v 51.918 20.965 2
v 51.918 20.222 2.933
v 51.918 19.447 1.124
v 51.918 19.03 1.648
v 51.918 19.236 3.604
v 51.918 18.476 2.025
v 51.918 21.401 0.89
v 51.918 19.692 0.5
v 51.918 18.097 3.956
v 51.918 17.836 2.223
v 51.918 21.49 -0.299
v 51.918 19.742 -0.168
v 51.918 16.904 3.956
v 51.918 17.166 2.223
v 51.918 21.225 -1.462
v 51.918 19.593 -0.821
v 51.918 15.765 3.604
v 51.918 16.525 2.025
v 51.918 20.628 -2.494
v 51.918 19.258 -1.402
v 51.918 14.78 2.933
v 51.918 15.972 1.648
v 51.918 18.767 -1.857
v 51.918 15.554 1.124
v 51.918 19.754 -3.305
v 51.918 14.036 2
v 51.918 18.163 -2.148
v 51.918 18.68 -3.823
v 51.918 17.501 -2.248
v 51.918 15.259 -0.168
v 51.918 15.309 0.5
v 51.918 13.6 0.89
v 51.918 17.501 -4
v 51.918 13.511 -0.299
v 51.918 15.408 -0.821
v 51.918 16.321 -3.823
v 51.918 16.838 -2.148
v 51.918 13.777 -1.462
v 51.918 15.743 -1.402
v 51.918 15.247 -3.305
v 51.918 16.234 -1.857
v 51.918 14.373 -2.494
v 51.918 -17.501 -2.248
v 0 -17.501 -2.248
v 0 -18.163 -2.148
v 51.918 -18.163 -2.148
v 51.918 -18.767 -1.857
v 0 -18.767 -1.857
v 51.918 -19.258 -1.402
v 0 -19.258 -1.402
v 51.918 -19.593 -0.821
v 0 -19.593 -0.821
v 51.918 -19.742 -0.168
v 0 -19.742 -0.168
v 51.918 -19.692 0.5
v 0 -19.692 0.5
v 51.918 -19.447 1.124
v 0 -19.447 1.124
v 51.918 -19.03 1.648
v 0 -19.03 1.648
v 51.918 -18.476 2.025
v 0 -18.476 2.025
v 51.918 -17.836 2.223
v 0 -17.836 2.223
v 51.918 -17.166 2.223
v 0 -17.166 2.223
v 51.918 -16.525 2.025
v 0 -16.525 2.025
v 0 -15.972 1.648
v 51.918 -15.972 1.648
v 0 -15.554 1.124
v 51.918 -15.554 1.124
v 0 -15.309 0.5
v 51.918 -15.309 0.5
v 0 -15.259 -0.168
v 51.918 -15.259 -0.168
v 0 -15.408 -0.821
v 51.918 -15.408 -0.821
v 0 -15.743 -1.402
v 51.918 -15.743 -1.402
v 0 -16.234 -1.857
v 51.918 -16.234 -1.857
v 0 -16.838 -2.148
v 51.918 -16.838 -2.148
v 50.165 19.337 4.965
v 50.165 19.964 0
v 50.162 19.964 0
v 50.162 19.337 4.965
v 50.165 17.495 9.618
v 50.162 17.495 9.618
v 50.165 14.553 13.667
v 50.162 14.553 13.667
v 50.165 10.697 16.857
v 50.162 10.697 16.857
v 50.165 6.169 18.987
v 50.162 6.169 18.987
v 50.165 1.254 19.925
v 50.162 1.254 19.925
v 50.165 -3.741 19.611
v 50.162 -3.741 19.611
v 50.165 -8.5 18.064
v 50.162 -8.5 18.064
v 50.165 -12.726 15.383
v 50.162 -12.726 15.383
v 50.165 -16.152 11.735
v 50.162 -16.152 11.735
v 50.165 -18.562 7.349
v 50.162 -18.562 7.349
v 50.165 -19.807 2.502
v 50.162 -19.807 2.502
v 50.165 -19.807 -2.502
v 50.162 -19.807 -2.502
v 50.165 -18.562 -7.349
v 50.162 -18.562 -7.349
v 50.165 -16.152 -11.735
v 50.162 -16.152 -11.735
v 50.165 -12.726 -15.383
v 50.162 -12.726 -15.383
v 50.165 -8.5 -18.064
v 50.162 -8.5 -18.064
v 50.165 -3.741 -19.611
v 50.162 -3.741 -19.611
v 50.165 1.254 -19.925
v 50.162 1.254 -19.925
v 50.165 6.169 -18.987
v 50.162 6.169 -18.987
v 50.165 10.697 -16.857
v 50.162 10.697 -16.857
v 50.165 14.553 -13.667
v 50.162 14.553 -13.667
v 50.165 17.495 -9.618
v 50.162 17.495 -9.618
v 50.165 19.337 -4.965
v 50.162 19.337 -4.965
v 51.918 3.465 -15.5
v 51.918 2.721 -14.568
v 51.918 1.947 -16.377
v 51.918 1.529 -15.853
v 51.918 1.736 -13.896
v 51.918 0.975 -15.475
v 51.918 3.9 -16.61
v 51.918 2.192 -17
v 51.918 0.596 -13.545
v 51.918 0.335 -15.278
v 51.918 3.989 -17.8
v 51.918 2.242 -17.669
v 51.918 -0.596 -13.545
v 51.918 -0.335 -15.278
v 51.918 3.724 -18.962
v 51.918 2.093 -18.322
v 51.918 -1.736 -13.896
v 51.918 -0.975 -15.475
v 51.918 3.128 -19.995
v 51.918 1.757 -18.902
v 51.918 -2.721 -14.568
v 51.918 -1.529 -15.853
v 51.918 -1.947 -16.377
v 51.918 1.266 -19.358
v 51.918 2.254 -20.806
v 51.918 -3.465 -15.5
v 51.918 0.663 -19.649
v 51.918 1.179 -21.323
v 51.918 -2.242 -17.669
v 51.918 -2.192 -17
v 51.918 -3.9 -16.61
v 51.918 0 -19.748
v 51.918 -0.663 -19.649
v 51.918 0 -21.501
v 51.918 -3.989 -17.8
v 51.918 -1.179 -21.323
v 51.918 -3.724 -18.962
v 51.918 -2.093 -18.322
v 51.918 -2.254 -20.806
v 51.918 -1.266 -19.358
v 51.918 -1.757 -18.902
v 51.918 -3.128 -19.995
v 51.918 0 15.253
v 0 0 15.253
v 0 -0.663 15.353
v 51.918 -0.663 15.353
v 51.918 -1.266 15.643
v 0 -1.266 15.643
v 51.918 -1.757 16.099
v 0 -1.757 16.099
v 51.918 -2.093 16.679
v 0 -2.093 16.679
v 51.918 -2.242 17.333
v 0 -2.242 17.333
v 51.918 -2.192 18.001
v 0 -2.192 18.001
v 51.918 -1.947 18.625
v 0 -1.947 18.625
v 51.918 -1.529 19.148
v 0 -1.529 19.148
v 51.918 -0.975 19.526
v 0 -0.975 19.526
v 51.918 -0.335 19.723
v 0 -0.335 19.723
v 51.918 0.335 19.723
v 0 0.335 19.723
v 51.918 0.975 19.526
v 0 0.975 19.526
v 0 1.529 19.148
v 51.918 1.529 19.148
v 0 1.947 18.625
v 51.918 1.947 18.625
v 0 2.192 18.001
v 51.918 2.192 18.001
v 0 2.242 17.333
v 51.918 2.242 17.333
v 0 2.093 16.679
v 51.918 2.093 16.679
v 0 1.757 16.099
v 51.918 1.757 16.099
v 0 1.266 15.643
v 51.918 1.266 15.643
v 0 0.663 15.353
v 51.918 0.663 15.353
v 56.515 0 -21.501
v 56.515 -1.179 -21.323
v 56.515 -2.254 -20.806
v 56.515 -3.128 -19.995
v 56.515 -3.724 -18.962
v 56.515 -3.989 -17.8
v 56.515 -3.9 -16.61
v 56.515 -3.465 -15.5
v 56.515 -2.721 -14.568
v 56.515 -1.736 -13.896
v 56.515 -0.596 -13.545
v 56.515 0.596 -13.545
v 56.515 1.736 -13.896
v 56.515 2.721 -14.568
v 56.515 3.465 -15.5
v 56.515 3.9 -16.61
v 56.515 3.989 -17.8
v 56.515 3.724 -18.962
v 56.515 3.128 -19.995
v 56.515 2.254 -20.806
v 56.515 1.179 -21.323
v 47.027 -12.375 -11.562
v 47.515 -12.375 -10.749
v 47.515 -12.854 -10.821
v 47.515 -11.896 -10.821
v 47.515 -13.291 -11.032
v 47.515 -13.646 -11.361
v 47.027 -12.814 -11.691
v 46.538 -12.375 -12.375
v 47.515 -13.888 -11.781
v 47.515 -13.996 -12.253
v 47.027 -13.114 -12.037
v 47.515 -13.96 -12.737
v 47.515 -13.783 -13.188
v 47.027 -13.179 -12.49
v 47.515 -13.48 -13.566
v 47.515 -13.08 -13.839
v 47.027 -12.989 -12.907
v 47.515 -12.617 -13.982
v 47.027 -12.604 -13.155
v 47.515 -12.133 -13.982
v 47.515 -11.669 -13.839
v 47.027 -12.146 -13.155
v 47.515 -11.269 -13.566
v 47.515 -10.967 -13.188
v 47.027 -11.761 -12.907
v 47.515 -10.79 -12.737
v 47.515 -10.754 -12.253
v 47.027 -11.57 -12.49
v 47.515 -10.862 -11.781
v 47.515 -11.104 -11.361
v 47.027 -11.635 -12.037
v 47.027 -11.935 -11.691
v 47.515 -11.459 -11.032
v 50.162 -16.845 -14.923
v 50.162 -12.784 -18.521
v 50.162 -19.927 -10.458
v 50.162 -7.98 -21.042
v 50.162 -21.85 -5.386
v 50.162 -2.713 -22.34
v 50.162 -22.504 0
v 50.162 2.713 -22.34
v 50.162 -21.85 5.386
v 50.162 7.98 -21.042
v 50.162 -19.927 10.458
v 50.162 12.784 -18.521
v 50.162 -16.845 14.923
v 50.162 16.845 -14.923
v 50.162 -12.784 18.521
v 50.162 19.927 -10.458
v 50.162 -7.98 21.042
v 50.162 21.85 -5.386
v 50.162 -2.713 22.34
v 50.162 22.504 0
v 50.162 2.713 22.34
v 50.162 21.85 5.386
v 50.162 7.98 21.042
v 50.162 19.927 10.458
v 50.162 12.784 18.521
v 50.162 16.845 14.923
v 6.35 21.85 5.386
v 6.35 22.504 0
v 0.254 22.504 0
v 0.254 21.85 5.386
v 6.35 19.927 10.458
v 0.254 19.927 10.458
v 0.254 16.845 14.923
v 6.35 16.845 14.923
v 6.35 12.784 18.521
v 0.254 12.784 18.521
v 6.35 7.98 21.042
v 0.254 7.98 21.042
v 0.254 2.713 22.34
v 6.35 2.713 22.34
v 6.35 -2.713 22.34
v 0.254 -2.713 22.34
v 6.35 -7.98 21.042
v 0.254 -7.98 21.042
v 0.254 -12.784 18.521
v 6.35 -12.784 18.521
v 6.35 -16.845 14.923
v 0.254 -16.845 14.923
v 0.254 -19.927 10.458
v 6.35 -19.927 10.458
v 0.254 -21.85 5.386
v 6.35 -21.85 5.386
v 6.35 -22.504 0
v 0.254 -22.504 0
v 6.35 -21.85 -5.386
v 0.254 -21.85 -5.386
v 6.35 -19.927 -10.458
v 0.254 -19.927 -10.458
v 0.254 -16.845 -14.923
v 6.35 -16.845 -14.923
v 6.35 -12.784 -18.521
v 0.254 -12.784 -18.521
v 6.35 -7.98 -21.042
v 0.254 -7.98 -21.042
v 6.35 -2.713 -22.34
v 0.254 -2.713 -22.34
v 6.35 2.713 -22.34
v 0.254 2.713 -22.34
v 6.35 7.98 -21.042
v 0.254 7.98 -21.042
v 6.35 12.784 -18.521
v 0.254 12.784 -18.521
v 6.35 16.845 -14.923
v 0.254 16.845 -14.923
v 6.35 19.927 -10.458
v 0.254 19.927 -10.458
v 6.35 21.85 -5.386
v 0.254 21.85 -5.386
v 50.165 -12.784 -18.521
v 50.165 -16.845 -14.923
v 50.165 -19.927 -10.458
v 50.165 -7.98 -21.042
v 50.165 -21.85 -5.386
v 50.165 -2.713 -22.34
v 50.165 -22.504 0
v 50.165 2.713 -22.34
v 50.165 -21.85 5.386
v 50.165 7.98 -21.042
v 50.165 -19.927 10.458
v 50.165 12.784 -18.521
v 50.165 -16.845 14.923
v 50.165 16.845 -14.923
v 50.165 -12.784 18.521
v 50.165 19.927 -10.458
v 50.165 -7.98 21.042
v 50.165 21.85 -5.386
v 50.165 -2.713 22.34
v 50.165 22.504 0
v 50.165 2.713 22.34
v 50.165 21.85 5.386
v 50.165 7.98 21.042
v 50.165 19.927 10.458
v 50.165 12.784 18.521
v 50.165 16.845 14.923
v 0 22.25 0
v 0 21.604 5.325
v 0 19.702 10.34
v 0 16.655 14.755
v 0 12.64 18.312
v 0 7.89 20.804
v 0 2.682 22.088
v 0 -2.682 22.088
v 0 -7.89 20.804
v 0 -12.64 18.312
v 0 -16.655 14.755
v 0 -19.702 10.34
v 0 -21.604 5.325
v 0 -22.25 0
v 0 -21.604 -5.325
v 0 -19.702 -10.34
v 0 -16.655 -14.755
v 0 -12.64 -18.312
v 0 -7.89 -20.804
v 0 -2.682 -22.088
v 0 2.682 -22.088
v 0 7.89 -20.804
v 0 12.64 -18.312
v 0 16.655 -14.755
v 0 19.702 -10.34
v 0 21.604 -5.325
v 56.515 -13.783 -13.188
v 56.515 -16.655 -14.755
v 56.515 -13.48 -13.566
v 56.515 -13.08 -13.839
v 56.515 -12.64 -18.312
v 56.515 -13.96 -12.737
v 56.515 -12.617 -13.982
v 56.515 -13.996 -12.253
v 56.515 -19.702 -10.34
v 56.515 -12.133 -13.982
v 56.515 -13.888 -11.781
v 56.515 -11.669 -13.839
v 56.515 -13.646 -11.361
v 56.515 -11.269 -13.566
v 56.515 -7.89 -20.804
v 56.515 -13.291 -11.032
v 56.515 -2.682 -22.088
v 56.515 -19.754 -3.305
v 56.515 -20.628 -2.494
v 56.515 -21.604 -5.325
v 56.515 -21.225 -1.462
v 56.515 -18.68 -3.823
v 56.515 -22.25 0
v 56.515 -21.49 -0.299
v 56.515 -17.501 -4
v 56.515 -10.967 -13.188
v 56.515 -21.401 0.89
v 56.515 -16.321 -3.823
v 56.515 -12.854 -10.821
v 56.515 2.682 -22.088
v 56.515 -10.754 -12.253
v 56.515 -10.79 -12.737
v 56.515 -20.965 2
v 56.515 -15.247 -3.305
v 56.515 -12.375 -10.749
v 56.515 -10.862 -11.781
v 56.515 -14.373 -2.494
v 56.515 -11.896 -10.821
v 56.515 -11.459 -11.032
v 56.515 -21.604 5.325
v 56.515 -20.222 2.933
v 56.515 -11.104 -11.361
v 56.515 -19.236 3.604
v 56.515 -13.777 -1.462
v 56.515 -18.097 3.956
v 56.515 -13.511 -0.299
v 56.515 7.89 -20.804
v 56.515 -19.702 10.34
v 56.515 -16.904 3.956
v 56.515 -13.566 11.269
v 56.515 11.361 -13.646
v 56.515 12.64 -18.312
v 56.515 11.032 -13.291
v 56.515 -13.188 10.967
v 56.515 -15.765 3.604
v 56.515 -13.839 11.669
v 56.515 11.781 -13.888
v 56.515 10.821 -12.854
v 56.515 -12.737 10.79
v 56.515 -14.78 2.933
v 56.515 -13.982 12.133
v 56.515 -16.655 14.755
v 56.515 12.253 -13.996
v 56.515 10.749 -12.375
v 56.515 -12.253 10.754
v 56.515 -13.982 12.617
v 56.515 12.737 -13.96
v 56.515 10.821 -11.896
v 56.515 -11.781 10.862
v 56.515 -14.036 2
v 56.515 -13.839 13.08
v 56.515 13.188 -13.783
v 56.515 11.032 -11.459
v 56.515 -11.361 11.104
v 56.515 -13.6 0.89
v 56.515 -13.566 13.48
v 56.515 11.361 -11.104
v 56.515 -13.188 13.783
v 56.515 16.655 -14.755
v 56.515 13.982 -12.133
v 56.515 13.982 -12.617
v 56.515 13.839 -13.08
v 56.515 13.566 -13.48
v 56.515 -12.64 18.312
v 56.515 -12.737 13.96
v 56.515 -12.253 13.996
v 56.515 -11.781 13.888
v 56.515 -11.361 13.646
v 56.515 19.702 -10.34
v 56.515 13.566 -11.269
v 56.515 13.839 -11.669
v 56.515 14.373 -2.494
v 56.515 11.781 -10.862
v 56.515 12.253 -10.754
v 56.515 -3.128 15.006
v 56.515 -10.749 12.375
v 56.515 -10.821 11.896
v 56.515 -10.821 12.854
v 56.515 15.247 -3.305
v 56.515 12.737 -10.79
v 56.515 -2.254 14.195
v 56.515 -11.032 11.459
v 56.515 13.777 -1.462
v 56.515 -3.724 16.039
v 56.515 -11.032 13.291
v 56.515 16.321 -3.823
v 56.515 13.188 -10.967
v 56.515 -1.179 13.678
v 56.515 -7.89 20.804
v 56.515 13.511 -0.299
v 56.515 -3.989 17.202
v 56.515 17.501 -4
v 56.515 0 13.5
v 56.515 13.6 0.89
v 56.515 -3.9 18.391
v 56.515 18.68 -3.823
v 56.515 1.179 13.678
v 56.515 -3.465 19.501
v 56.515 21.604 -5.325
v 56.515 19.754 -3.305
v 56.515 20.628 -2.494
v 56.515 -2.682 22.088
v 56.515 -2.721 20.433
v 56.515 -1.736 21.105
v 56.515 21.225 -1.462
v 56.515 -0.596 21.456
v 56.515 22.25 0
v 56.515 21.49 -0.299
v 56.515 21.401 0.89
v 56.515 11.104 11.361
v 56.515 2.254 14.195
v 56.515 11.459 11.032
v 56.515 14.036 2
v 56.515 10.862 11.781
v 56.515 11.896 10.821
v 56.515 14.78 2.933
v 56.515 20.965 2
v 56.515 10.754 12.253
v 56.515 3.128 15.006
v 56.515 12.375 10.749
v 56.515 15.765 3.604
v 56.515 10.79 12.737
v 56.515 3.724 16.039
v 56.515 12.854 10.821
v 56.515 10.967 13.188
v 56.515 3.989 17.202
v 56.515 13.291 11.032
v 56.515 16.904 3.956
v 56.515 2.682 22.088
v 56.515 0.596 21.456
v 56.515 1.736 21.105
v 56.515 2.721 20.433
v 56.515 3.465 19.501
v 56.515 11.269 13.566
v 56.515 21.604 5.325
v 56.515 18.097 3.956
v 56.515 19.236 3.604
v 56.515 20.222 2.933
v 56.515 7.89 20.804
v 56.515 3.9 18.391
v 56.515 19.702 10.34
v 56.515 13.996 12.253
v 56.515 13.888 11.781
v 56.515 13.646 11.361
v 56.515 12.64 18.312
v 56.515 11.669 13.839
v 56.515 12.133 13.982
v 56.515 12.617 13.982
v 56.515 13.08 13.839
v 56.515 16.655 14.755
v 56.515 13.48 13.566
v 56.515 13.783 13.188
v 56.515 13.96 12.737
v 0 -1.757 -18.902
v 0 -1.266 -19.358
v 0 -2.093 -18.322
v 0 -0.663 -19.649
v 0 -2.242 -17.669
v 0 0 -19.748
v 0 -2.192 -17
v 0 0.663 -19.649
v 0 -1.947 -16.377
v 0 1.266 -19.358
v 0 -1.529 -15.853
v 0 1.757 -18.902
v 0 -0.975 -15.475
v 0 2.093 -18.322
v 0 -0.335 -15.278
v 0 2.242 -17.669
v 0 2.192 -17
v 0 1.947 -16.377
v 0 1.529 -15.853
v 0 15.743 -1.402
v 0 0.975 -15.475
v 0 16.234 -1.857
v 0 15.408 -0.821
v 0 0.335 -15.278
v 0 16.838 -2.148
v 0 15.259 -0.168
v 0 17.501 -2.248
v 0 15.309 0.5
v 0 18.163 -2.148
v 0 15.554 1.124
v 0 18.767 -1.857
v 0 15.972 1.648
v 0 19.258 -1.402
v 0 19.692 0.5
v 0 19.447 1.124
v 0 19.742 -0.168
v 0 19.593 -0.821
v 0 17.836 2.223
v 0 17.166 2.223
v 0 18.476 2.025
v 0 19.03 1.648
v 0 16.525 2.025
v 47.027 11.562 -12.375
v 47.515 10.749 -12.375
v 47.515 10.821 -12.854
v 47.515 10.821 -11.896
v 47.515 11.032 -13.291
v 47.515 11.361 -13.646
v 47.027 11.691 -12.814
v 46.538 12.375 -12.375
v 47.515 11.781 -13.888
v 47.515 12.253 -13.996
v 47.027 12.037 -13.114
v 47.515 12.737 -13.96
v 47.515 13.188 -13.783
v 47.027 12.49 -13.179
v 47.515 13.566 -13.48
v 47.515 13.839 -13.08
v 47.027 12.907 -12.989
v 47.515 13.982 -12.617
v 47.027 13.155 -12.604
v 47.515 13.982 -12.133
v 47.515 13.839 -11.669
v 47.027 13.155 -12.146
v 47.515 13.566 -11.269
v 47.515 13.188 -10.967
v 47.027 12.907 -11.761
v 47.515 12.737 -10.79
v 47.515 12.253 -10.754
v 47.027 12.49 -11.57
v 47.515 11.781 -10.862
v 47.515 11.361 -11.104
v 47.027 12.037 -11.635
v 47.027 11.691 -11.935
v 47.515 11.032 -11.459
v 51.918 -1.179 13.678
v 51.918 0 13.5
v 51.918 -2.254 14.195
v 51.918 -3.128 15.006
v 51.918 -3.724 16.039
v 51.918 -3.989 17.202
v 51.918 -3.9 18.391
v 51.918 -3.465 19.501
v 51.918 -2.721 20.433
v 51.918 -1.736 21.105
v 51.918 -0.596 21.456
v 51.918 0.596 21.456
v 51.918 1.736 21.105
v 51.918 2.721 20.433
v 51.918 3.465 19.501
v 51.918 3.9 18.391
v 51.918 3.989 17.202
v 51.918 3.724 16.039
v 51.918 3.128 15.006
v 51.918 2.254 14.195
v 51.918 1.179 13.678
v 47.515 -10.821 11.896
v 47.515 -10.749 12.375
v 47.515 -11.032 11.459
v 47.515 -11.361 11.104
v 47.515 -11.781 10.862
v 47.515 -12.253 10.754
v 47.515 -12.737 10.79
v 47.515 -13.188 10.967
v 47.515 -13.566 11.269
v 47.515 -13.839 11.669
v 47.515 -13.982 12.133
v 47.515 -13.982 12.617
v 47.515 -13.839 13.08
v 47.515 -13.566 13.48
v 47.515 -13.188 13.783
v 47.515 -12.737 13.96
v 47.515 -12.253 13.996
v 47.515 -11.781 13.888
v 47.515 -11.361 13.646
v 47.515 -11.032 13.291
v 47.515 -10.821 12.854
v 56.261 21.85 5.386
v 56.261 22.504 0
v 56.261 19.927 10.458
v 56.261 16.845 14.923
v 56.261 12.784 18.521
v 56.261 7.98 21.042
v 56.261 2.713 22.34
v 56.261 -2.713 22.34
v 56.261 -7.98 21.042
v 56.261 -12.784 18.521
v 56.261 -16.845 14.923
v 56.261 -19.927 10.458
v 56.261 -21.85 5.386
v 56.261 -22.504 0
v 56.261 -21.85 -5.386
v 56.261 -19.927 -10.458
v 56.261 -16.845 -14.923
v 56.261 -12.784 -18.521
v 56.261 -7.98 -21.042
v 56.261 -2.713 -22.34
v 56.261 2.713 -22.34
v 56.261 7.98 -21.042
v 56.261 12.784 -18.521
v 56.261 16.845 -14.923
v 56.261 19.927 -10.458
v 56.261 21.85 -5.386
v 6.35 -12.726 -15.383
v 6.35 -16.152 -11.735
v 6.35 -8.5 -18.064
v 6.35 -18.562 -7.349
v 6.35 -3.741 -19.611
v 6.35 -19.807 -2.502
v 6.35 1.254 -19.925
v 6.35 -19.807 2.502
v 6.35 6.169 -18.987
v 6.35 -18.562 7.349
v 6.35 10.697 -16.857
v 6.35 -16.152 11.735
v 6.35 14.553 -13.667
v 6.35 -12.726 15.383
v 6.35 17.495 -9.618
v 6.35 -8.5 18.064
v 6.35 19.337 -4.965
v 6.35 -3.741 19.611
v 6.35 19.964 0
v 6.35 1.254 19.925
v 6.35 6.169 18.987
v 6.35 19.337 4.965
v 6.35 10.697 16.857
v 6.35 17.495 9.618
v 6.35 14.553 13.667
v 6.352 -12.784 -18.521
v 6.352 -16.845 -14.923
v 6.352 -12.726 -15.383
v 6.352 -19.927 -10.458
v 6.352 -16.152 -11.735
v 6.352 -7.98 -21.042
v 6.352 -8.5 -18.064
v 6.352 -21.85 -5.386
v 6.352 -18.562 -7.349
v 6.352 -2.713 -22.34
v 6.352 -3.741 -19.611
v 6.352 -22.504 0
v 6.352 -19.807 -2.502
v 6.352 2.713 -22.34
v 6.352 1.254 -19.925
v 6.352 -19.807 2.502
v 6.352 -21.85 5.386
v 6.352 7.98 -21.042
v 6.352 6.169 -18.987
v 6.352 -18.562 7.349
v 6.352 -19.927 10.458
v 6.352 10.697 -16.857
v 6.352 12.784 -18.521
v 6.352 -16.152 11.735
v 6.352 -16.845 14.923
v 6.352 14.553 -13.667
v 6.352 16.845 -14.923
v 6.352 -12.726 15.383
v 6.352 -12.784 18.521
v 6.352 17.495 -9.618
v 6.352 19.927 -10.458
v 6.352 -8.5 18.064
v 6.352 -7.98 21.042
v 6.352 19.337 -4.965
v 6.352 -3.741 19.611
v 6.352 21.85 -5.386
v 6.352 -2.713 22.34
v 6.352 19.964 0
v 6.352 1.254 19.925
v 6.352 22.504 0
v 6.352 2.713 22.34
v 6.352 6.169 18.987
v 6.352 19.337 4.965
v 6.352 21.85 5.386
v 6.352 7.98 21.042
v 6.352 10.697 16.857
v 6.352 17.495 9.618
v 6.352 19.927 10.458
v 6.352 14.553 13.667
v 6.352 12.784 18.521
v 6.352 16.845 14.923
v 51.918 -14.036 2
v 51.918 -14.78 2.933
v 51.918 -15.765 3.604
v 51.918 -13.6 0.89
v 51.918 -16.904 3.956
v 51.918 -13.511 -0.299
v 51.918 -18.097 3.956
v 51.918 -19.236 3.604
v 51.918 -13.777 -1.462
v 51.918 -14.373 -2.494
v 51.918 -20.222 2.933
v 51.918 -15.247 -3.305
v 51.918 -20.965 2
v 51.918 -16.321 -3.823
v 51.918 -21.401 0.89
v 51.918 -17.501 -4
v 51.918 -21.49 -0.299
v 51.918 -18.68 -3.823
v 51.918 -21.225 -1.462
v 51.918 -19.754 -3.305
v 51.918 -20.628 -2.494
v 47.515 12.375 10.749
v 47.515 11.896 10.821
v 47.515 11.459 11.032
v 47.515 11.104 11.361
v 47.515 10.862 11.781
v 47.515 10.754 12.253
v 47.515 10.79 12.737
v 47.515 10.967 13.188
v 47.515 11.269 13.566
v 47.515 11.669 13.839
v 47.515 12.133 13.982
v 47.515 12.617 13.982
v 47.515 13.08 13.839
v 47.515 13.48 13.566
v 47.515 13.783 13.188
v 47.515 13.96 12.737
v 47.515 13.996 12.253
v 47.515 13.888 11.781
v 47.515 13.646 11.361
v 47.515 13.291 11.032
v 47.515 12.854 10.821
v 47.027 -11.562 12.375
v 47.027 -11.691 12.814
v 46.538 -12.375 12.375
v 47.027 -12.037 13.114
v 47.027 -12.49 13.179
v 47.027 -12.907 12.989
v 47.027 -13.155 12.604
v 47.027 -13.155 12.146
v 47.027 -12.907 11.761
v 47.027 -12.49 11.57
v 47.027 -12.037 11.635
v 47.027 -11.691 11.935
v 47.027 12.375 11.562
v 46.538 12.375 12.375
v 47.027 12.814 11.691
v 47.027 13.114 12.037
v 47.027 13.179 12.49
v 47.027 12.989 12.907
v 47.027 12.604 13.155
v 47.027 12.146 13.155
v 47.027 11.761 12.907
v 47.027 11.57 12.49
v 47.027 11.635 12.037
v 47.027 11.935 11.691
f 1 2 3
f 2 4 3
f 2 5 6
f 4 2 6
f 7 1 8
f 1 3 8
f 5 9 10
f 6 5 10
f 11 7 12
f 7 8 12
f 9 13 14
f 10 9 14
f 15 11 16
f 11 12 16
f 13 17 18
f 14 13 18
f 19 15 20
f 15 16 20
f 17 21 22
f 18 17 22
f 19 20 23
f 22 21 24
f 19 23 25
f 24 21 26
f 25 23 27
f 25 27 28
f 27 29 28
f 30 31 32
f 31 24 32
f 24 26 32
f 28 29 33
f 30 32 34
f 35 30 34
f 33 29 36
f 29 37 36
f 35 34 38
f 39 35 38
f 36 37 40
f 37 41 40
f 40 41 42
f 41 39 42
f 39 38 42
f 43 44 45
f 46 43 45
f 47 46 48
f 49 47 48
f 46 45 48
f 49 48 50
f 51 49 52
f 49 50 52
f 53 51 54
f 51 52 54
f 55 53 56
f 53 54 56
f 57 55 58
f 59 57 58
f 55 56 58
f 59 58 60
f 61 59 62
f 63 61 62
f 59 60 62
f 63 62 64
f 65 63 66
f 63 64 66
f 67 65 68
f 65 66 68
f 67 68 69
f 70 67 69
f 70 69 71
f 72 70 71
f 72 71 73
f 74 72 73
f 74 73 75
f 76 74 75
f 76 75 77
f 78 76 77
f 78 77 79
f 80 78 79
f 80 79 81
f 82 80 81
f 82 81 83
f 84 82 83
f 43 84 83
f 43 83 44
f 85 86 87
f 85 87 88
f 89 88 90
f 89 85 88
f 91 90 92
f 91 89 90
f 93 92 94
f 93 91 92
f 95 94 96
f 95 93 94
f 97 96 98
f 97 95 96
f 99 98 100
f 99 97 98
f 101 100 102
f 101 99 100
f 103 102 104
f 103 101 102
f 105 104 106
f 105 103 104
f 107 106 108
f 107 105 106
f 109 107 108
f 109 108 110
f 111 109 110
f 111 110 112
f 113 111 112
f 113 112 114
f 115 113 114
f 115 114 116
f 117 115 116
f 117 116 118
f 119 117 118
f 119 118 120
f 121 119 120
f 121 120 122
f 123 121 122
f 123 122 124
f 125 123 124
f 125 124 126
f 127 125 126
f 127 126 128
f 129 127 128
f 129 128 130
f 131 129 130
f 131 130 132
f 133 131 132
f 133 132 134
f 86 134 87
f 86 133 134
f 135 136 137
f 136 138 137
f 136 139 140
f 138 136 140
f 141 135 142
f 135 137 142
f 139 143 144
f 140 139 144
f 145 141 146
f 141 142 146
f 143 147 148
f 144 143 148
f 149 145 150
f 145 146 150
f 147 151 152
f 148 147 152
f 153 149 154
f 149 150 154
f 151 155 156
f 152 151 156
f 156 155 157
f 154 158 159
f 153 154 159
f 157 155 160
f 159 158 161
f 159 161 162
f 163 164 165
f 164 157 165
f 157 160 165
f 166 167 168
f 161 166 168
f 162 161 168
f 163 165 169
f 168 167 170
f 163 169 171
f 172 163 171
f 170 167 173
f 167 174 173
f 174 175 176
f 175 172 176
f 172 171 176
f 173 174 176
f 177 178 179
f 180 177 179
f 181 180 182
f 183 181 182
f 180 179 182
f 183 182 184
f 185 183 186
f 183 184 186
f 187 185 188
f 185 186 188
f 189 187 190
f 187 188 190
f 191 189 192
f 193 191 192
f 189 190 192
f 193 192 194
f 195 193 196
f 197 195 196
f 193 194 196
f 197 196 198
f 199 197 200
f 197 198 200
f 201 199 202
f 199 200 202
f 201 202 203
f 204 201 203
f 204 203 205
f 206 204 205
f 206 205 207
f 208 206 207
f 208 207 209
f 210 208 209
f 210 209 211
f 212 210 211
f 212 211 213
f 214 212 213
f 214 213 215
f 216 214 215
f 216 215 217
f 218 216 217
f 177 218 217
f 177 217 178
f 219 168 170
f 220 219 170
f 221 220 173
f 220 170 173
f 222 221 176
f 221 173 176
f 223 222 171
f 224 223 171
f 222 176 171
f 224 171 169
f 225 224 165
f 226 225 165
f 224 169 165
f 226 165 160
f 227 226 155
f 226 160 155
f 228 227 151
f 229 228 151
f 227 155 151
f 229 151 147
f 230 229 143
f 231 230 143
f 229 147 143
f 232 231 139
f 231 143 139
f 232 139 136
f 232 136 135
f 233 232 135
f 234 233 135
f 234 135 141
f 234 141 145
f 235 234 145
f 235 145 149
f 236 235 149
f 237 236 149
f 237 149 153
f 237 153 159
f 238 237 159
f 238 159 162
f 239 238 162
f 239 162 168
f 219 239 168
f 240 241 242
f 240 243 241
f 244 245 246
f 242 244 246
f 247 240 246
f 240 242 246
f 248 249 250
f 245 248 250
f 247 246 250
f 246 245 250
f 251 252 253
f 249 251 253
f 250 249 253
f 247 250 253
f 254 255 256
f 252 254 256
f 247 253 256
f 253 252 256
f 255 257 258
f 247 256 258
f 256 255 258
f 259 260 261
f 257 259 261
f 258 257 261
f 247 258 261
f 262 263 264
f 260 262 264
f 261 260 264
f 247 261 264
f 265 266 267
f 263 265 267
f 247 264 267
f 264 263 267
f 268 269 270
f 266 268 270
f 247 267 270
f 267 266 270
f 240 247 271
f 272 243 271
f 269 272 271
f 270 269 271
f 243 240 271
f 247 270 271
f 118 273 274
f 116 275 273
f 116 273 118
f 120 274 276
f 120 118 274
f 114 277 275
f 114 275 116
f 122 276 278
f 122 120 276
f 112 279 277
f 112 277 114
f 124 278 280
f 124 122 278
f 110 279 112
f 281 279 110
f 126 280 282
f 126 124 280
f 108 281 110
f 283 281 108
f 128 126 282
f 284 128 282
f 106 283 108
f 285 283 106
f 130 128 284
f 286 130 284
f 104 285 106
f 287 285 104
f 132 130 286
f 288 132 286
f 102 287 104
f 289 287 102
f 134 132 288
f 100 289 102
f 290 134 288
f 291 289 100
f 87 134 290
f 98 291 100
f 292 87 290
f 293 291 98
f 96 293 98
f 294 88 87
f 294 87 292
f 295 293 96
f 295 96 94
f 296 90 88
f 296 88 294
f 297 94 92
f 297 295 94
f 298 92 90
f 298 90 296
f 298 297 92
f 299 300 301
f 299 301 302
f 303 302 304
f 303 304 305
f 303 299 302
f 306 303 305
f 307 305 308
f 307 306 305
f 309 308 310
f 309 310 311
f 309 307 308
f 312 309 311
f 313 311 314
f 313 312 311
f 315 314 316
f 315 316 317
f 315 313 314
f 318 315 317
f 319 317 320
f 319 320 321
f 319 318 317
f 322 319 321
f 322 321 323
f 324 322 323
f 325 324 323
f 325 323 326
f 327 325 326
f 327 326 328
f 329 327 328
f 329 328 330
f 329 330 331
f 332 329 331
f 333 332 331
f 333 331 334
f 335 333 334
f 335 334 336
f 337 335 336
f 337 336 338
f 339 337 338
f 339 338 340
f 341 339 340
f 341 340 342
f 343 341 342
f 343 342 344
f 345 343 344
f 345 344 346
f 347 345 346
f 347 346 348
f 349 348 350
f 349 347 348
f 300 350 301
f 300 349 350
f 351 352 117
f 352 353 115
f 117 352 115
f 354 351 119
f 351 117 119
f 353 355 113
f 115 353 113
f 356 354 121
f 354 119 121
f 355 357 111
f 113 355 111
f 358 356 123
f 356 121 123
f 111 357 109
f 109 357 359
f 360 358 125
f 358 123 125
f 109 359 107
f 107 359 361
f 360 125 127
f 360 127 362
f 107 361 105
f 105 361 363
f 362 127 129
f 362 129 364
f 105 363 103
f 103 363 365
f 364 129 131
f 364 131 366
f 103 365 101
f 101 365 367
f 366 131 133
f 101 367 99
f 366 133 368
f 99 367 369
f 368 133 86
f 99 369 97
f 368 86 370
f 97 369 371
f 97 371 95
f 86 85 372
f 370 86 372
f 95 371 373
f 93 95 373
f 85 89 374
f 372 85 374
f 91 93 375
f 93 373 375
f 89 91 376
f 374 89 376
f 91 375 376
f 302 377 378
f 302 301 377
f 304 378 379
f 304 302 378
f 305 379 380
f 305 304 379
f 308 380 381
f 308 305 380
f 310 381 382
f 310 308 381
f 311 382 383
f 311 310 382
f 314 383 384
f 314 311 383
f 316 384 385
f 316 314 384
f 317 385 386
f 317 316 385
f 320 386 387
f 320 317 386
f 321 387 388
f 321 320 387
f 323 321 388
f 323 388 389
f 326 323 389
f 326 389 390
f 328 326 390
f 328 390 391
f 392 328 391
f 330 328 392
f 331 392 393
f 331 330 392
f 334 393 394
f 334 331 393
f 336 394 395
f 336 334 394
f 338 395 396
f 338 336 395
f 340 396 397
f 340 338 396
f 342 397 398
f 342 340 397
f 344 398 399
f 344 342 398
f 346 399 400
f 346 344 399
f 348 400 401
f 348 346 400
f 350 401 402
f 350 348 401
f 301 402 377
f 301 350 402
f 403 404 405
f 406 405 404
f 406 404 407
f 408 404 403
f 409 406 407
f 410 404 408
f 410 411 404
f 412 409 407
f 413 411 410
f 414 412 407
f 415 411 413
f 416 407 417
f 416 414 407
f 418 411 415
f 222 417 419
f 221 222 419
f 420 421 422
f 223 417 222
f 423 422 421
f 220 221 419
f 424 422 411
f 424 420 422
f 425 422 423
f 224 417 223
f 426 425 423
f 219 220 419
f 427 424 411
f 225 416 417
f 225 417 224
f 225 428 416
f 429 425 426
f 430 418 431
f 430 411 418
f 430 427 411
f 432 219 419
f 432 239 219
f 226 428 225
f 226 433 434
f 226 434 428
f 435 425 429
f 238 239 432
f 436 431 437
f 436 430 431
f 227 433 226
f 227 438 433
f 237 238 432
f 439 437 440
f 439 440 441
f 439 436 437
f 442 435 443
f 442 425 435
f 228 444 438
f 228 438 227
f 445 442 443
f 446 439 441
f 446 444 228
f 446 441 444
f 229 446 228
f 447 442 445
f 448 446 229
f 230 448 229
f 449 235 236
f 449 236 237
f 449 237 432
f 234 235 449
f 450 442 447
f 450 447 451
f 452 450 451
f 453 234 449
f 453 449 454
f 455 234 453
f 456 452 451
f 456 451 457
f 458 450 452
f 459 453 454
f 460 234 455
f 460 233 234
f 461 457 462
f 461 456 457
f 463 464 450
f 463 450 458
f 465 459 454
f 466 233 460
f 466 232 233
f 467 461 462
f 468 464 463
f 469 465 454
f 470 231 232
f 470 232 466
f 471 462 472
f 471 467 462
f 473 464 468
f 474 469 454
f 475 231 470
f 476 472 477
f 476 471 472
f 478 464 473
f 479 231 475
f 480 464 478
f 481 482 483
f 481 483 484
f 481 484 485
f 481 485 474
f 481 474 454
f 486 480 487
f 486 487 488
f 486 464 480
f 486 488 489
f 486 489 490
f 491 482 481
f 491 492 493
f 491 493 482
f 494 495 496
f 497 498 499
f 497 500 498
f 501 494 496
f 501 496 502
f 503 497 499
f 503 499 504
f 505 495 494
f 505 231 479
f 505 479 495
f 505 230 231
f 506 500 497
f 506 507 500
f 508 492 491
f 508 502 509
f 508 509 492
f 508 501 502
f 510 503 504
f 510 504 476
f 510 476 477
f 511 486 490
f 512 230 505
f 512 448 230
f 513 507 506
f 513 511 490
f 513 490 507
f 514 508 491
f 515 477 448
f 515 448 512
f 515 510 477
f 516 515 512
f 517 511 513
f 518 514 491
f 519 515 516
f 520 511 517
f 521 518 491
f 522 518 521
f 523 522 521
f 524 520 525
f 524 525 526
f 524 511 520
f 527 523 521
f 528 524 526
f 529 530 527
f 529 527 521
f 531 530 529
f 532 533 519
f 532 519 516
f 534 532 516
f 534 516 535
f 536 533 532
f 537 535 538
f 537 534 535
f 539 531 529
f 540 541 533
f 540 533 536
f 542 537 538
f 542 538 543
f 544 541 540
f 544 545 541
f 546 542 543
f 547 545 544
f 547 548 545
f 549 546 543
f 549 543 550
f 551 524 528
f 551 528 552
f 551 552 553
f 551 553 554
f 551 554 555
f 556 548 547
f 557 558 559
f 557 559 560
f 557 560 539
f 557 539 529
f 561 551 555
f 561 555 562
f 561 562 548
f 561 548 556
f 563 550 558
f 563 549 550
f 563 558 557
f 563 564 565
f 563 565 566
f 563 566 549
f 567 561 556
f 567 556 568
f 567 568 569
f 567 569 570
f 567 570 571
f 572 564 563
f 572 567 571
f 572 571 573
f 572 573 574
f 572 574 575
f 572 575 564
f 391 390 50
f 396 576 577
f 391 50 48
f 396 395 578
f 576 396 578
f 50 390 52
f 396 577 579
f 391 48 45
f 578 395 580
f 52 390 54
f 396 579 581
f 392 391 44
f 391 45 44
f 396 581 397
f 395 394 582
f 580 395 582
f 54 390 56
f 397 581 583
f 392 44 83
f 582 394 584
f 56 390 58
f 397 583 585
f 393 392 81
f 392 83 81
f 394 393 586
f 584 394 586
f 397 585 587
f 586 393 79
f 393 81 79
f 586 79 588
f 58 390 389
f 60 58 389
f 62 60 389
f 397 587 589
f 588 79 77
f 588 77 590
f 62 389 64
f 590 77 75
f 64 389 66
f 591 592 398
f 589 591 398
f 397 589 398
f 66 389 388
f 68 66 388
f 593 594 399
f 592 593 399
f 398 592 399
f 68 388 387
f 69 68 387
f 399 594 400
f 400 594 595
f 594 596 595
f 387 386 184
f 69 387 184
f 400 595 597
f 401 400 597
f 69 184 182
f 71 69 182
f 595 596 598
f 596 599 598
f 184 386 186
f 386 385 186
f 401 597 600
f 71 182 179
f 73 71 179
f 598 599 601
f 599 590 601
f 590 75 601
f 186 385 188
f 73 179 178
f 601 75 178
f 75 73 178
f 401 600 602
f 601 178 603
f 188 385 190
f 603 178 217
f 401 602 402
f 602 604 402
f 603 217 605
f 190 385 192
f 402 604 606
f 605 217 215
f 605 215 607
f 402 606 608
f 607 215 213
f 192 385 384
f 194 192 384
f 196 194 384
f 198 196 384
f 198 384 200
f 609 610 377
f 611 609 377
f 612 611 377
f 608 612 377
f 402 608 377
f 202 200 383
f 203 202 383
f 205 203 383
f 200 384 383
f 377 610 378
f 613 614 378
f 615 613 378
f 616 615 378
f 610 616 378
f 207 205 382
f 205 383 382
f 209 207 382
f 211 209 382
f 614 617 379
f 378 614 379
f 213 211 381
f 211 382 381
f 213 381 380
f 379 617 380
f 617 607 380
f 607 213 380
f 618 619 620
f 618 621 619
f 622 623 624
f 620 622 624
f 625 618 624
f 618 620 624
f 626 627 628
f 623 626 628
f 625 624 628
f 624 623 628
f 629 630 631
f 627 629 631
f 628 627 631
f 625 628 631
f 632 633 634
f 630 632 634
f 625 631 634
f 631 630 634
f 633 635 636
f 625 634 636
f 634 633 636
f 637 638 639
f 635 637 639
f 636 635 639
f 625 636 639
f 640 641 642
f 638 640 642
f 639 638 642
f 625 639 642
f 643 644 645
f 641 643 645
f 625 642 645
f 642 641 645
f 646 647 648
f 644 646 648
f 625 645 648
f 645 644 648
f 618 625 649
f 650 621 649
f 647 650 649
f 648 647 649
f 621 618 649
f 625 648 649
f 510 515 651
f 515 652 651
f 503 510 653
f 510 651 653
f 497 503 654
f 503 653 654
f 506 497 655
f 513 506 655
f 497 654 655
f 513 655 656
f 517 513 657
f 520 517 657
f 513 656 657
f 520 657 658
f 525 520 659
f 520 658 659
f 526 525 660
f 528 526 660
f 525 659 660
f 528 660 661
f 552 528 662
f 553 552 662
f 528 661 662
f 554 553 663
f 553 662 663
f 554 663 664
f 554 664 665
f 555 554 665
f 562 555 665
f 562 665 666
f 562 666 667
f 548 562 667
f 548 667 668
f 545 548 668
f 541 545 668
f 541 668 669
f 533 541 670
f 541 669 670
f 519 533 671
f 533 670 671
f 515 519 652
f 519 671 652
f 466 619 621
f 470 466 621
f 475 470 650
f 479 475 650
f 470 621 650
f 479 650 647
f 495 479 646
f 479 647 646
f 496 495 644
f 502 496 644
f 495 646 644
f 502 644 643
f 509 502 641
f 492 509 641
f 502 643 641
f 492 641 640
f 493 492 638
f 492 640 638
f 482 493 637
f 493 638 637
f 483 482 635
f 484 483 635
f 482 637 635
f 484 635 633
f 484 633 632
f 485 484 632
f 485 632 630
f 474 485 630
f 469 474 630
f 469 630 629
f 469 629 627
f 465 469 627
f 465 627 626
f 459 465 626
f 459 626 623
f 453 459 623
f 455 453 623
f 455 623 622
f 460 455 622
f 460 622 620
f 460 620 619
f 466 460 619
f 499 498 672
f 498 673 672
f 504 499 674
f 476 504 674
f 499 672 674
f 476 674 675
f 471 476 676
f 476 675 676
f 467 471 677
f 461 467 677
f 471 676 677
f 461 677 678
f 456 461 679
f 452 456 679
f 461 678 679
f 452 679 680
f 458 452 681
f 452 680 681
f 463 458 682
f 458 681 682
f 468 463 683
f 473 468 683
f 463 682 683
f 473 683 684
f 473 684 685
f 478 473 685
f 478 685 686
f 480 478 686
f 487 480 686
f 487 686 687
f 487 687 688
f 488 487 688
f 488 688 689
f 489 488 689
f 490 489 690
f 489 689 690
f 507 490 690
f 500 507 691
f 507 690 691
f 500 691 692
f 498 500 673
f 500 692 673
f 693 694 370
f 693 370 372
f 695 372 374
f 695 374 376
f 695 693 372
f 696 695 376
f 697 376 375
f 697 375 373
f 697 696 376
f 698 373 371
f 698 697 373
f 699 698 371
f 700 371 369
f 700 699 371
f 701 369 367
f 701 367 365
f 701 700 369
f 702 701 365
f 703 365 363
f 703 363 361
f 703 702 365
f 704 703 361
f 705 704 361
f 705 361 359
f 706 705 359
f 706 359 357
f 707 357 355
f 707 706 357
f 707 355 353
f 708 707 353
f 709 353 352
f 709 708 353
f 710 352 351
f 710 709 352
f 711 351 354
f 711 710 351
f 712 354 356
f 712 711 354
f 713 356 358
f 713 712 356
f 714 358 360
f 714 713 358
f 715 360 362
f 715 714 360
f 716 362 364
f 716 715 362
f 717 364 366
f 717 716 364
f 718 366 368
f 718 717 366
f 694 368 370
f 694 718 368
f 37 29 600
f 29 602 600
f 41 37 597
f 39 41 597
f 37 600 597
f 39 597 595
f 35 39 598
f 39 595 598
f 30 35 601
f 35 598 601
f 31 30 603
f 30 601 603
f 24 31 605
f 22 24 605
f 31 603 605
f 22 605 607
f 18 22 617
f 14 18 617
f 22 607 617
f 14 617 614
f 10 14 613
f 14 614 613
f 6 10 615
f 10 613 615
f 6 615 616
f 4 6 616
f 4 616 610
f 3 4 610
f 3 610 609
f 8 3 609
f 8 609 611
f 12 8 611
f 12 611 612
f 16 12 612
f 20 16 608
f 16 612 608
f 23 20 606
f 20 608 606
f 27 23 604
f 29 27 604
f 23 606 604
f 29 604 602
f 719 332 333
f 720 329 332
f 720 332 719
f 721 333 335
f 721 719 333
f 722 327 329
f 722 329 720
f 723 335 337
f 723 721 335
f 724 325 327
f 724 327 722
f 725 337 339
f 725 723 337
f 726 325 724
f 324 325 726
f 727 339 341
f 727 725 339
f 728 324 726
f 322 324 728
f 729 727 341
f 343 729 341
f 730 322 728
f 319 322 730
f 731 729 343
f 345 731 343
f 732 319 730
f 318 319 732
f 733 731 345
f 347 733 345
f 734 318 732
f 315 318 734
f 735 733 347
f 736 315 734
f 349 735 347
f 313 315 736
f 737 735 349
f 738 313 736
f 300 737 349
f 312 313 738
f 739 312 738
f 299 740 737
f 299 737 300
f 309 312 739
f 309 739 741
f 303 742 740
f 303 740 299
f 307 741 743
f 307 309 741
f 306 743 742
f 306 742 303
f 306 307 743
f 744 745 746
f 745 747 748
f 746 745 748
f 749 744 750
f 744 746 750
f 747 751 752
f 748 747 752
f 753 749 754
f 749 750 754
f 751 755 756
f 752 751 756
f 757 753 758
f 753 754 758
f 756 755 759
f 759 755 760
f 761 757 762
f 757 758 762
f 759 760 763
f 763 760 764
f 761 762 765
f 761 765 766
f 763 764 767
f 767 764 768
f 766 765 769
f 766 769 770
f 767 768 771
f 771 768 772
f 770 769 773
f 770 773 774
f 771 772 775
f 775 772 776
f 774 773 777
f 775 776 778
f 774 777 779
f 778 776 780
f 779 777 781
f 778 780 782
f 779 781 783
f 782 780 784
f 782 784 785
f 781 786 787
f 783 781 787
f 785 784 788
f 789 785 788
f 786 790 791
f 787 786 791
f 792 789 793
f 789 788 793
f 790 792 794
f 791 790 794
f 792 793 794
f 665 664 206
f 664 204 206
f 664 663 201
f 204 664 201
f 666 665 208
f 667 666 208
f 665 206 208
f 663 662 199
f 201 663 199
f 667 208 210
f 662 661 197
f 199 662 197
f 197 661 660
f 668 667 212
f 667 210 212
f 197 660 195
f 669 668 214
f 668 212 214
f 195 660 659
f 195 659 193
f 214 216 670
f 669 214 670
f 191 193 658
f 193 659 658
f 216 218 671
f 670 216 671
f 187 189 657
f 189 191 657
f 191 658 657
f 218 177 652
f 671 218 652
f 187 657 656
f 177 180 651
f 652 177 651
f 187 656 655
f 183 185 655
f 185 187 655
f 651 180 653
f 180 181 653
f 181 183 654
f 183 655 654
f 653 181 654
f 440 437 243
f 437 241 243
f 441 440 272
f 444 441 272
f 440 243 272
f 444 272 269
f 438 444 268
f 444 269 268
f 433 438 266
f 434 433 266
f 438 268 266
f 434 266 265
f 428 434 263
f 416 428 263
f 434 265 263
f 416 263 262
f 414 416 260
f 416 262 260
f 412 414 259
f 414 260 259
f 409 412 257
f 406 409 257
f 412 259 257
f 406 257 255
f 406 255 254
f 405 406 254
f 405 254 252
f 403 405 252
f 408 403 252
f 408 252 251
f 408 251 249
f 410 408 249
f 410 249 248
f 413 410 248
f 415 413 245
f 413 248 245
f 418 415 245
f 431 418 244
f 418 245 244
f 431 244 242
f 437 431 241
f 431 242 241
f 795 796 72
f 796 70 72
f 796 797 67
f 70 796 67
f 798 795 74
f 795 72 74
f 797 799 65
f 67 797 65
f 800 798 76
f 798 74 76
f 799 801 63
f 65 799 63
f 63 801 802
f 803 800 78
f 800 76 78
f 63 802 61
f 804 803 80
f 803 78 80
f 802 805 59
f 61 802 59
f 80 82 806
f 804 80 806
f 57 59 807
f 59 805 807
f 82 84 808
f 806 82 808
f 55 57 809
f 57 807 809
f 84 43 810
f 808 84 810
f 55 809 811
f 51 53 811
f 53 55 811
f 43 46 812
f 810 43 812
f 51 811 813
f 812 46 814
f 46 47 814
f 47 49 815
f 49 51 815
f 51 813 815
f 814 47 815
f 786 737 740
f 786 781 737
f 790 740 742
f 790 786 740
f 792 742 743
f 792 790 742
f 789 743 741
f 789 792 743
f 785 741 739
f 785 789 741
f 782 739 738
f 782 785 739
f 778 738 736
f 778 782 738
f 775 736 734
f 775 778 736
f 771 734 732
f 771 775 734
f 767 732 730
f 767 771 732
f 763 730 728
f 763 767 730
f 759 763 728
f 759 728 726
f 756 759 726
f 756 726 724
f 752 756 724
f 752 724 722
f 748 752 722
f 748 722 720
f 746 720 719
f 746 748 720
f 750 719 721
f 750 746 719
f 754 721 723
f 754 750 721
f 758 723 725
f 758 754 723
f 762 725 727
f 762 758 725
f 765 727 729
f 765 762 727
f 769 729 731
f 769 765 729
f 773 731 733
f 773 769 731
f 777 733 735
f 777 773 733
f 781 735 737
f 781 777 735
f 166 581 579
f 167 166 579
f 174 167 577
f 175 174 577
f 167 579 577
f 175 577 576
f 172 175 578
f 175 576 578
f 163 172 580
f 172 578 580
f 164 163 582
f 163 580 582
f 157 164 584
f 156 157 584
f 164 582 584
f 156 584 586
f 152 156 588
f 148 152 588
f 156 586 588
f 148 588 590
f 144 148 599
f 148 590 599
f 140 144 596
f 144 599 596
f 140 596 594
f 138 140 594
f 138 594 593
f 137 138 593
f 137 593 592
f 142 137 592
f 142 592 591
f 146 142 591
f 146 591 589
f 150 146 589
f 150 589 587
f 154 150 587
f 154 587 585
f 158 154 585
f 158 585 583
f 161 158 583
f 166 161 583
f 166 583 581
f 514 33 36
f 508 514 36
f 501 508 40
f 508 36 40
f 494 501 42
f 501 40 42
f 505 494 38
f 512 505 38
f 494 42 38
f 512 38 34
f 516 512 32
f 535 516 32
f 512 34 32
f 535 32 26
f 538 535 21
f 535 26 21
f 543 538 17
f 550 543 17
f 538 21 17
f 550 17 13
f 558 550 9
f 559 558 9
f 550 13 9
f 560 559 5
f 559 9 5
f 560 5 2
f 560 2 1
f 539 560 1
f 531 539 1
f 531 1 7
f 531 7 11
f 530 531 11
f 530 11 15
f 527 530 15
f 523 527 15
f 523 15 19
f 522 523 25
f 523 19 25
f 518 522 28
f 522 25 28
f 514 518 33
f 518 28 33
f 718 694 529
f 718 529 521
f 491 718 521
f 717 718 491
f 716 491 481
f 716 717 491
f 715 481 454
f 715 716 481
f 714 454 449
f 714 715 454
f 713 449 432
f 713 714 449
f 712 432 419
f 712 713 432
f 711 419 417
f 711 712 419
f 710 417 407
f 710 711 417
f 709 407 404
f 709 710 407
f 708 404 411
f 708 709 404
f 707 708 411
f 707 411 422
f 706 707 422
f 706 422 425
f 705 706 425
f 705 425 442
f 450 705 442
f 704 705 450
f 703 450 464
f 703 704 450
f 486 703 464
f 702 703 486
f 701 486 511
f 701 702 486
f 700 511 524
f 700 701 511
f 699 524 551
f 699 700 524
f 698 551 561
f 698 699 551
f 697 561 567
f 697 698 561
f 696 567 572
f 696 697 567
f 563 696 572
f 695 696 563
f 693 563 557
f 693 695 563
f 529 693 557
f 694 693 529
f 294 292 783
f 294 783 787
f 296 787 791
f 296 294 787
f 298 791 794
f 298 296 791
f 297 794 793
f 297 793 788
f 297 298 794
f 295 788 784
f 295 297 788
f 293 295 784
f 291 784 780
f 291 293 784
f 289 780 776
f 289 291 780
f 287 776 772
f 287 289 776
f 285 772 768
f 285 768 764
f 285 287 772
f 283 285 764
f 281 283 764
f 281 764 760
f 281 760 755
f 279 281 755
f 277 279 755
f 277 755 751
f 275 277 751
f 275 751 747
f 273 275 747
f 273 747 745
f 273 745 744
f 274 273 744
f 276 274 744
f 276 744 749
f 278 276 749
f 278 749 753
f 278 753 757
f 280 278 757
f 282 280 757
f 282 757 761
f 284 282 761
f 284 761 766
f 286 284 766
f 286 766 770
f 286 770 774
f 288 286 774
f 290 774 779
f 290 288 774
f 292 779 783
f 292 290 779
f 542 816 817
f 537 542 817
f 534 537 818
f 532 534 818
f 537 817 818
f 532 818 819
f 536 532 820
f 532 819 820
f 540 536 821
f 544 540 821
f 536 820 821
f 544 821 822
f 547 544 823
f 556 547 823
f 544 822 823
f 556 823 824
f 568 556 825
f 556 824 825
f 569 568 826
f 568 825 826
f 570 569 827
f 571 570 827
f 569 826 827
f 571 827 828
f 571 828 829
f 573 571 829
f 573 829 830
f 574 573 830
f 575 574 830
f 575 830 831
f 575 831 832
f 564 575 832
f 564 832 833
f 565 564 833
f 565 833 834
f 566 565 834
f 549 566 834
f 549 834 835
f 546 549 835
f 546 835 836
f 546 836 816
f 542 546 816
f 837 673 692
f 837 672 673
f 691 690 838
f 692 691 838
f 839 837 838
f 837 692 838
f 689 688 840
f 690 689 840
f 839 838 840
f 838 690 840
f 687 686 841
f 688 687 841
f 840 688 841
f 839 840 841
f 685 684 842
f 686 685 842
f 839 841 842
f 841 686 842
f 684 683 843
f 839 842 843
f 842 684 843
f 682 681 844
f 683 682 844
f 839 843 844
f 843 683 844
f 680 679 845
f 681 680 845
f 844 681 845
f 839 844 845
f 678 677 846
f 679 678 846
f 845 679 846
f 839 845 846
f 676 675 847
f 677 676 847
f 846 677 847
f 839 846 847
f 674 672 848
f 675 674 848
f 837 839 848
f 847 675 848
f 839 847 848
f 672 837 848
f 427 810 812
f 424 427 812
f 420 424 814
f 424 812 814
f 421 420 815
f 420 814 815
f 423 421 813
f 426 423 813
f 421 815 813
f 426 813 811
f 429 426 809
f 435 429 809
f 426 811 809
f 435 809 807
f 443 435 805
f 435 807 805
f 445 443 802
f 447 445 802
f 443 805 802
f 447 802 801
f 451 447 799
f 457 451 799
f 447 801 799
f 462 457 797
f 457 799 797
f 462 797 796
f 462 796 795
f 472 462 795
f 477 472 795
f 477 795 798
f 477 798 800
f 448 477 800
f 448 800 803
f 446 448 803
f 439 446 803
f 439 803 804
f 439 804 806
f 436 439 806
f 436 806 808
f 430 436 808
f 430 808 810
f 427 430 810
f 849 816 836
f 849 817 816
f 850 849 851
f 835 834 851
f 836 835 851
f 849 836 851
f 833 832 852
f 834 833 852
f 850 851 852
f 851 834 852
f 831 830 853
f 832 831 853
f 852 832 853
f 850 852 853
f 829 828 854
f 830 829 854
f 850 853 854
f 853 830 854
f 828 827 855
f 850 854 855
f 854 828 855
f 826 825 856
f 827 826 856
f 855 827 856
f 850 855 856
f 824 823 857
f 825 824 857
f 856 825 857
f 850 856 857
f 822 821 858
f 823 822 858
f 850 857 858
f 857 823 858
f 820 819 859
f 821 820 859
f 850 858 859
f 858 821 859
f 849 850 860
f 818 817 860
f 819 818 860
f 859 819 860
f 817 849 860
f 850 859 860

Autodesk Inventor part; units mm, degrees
ref_plane "YZ Plane" through (0, 0, 0) normal (1, 0, 0) x (0, 1, 0)
ref_plane "XZ Plane" through (0, 0, 0) normal (0, 1, 0) x (-1, 0, 0)
ref_plane "XY Plane" through (0, 0, 0) normal (0, 0, 1) x (1, 0, 0)
sketch "Sketch1" plane through (0, 0, 0) normal (0, 0, 1) x (1, 0, 0)
  line L0 (0, 0) -> (0, 22.5044)
  line L1 (0, 22.5044) -> (6.35, 22.5044)
  line L2 (6.35, 22.5044) -> (6.35, 19.9644)
  line L3 (6.35, 19.9644) -> (50.165, 19.9644)
  line L4 (50.165, 19.9644) -> (50.165, 22.5044)
  line L5 (50.165, 22.5044) -> (56.515, 22.5044)
  line L6 (56.515, 22.5044) -> (56.515, 0)
  line L7 (0, 0) -> (56.515, 0)
  dimension "d0" = 22.5044
  dimension "d1" = 6.35
  dimension "d2" = 2.54
  dimension "d3" = 43.815
  dimension "d4" = 6.35
revolve "Revolution1" add sketch "Sketch1" angle 360 about axis through (0, 0, 0) along (1, 0, 0)
sketch "Sketch2" plane through (0, 0, 0) normal (0, 0, 1) x (1, 0, 0)
  line L0 (6.35, 19.9644) -> (50.165, 19.9644) projected
  line L1 (6.35, -22.5044) -> (6.35, 22.5044) projected
  line L2 (50.165, -22.5044) -> (50.165, 22.5044) projected
  line L3 (6.3525, 22.5044) -> (50.1625, 22.5044)
  line L4 (6.3525, 22.5044) -> (6.3525, 19.9644)
  line L5 (50.1625, 22.5044) -> (50.1625, 19.9644)
  line L6 (-11.303, 0) -> (67.818, 0) projected
  point P0 (0, 0)
  dimension "d6" = 0.0025
  dimension "d7" = 0.0025
revolve "Revolution2" add sketch "Sketch2" angle 360 about axis through (-10, 0, 0) along (1, 0, 0) contours L4 L3 L5 L0
chamfer "Chamfer1" distance 0.254 angle 45 2 edges at (56.515, -22.5044, 0) (0, -22.5044, 0)
sketch "Sketch3" plane through (56.515, 0, 0) normal (1, 0, 0) x (0, 0, -1)
  circle A0 centre (0, 0) radius 22.2504 projected
  circle A1 centre (0, 0) radius 17.5006 construction
  line L0 (0, 0) -> (-12.3748, 12.3748) construction
  line L1 (0, 0) -> (-17.5006, 0) construction
  point P0 (0, 17.5006)
  point P1 (0, -17.5006)
  point P2 (17.5006, 0)
  dimension "d12" = 17.5006
  dimension "d14" = 45
hole "Hole1" at (56.515, 17.5006, 0) at (56.515, -17.5006, 0) at (56.515, 0, 17.5006) at (56.515, 0, -17.5006) direction (-1, 0, 0) diameter 4.4958 end through all counterbore diameter 8.001 counterbore depth 4.5974 clearance for "Socket Head Cap Screw ISO 4762" size "M4" standard "ISO"
hole "Hole2" at (56.515, 12.3748, 12.3748) direction (-1, 0, 0) diameter 3.2512 depth 9 tip angle 118
pattern_circular "Circular Pattern1" count 4 over 360 about axis through (-10, 0, 0) along (1, 0, 0) of "Hole2"
equation "\"d7\" = d6"
properties part number "MOT_Gearbox_am0939" material "Steel, Mild"
